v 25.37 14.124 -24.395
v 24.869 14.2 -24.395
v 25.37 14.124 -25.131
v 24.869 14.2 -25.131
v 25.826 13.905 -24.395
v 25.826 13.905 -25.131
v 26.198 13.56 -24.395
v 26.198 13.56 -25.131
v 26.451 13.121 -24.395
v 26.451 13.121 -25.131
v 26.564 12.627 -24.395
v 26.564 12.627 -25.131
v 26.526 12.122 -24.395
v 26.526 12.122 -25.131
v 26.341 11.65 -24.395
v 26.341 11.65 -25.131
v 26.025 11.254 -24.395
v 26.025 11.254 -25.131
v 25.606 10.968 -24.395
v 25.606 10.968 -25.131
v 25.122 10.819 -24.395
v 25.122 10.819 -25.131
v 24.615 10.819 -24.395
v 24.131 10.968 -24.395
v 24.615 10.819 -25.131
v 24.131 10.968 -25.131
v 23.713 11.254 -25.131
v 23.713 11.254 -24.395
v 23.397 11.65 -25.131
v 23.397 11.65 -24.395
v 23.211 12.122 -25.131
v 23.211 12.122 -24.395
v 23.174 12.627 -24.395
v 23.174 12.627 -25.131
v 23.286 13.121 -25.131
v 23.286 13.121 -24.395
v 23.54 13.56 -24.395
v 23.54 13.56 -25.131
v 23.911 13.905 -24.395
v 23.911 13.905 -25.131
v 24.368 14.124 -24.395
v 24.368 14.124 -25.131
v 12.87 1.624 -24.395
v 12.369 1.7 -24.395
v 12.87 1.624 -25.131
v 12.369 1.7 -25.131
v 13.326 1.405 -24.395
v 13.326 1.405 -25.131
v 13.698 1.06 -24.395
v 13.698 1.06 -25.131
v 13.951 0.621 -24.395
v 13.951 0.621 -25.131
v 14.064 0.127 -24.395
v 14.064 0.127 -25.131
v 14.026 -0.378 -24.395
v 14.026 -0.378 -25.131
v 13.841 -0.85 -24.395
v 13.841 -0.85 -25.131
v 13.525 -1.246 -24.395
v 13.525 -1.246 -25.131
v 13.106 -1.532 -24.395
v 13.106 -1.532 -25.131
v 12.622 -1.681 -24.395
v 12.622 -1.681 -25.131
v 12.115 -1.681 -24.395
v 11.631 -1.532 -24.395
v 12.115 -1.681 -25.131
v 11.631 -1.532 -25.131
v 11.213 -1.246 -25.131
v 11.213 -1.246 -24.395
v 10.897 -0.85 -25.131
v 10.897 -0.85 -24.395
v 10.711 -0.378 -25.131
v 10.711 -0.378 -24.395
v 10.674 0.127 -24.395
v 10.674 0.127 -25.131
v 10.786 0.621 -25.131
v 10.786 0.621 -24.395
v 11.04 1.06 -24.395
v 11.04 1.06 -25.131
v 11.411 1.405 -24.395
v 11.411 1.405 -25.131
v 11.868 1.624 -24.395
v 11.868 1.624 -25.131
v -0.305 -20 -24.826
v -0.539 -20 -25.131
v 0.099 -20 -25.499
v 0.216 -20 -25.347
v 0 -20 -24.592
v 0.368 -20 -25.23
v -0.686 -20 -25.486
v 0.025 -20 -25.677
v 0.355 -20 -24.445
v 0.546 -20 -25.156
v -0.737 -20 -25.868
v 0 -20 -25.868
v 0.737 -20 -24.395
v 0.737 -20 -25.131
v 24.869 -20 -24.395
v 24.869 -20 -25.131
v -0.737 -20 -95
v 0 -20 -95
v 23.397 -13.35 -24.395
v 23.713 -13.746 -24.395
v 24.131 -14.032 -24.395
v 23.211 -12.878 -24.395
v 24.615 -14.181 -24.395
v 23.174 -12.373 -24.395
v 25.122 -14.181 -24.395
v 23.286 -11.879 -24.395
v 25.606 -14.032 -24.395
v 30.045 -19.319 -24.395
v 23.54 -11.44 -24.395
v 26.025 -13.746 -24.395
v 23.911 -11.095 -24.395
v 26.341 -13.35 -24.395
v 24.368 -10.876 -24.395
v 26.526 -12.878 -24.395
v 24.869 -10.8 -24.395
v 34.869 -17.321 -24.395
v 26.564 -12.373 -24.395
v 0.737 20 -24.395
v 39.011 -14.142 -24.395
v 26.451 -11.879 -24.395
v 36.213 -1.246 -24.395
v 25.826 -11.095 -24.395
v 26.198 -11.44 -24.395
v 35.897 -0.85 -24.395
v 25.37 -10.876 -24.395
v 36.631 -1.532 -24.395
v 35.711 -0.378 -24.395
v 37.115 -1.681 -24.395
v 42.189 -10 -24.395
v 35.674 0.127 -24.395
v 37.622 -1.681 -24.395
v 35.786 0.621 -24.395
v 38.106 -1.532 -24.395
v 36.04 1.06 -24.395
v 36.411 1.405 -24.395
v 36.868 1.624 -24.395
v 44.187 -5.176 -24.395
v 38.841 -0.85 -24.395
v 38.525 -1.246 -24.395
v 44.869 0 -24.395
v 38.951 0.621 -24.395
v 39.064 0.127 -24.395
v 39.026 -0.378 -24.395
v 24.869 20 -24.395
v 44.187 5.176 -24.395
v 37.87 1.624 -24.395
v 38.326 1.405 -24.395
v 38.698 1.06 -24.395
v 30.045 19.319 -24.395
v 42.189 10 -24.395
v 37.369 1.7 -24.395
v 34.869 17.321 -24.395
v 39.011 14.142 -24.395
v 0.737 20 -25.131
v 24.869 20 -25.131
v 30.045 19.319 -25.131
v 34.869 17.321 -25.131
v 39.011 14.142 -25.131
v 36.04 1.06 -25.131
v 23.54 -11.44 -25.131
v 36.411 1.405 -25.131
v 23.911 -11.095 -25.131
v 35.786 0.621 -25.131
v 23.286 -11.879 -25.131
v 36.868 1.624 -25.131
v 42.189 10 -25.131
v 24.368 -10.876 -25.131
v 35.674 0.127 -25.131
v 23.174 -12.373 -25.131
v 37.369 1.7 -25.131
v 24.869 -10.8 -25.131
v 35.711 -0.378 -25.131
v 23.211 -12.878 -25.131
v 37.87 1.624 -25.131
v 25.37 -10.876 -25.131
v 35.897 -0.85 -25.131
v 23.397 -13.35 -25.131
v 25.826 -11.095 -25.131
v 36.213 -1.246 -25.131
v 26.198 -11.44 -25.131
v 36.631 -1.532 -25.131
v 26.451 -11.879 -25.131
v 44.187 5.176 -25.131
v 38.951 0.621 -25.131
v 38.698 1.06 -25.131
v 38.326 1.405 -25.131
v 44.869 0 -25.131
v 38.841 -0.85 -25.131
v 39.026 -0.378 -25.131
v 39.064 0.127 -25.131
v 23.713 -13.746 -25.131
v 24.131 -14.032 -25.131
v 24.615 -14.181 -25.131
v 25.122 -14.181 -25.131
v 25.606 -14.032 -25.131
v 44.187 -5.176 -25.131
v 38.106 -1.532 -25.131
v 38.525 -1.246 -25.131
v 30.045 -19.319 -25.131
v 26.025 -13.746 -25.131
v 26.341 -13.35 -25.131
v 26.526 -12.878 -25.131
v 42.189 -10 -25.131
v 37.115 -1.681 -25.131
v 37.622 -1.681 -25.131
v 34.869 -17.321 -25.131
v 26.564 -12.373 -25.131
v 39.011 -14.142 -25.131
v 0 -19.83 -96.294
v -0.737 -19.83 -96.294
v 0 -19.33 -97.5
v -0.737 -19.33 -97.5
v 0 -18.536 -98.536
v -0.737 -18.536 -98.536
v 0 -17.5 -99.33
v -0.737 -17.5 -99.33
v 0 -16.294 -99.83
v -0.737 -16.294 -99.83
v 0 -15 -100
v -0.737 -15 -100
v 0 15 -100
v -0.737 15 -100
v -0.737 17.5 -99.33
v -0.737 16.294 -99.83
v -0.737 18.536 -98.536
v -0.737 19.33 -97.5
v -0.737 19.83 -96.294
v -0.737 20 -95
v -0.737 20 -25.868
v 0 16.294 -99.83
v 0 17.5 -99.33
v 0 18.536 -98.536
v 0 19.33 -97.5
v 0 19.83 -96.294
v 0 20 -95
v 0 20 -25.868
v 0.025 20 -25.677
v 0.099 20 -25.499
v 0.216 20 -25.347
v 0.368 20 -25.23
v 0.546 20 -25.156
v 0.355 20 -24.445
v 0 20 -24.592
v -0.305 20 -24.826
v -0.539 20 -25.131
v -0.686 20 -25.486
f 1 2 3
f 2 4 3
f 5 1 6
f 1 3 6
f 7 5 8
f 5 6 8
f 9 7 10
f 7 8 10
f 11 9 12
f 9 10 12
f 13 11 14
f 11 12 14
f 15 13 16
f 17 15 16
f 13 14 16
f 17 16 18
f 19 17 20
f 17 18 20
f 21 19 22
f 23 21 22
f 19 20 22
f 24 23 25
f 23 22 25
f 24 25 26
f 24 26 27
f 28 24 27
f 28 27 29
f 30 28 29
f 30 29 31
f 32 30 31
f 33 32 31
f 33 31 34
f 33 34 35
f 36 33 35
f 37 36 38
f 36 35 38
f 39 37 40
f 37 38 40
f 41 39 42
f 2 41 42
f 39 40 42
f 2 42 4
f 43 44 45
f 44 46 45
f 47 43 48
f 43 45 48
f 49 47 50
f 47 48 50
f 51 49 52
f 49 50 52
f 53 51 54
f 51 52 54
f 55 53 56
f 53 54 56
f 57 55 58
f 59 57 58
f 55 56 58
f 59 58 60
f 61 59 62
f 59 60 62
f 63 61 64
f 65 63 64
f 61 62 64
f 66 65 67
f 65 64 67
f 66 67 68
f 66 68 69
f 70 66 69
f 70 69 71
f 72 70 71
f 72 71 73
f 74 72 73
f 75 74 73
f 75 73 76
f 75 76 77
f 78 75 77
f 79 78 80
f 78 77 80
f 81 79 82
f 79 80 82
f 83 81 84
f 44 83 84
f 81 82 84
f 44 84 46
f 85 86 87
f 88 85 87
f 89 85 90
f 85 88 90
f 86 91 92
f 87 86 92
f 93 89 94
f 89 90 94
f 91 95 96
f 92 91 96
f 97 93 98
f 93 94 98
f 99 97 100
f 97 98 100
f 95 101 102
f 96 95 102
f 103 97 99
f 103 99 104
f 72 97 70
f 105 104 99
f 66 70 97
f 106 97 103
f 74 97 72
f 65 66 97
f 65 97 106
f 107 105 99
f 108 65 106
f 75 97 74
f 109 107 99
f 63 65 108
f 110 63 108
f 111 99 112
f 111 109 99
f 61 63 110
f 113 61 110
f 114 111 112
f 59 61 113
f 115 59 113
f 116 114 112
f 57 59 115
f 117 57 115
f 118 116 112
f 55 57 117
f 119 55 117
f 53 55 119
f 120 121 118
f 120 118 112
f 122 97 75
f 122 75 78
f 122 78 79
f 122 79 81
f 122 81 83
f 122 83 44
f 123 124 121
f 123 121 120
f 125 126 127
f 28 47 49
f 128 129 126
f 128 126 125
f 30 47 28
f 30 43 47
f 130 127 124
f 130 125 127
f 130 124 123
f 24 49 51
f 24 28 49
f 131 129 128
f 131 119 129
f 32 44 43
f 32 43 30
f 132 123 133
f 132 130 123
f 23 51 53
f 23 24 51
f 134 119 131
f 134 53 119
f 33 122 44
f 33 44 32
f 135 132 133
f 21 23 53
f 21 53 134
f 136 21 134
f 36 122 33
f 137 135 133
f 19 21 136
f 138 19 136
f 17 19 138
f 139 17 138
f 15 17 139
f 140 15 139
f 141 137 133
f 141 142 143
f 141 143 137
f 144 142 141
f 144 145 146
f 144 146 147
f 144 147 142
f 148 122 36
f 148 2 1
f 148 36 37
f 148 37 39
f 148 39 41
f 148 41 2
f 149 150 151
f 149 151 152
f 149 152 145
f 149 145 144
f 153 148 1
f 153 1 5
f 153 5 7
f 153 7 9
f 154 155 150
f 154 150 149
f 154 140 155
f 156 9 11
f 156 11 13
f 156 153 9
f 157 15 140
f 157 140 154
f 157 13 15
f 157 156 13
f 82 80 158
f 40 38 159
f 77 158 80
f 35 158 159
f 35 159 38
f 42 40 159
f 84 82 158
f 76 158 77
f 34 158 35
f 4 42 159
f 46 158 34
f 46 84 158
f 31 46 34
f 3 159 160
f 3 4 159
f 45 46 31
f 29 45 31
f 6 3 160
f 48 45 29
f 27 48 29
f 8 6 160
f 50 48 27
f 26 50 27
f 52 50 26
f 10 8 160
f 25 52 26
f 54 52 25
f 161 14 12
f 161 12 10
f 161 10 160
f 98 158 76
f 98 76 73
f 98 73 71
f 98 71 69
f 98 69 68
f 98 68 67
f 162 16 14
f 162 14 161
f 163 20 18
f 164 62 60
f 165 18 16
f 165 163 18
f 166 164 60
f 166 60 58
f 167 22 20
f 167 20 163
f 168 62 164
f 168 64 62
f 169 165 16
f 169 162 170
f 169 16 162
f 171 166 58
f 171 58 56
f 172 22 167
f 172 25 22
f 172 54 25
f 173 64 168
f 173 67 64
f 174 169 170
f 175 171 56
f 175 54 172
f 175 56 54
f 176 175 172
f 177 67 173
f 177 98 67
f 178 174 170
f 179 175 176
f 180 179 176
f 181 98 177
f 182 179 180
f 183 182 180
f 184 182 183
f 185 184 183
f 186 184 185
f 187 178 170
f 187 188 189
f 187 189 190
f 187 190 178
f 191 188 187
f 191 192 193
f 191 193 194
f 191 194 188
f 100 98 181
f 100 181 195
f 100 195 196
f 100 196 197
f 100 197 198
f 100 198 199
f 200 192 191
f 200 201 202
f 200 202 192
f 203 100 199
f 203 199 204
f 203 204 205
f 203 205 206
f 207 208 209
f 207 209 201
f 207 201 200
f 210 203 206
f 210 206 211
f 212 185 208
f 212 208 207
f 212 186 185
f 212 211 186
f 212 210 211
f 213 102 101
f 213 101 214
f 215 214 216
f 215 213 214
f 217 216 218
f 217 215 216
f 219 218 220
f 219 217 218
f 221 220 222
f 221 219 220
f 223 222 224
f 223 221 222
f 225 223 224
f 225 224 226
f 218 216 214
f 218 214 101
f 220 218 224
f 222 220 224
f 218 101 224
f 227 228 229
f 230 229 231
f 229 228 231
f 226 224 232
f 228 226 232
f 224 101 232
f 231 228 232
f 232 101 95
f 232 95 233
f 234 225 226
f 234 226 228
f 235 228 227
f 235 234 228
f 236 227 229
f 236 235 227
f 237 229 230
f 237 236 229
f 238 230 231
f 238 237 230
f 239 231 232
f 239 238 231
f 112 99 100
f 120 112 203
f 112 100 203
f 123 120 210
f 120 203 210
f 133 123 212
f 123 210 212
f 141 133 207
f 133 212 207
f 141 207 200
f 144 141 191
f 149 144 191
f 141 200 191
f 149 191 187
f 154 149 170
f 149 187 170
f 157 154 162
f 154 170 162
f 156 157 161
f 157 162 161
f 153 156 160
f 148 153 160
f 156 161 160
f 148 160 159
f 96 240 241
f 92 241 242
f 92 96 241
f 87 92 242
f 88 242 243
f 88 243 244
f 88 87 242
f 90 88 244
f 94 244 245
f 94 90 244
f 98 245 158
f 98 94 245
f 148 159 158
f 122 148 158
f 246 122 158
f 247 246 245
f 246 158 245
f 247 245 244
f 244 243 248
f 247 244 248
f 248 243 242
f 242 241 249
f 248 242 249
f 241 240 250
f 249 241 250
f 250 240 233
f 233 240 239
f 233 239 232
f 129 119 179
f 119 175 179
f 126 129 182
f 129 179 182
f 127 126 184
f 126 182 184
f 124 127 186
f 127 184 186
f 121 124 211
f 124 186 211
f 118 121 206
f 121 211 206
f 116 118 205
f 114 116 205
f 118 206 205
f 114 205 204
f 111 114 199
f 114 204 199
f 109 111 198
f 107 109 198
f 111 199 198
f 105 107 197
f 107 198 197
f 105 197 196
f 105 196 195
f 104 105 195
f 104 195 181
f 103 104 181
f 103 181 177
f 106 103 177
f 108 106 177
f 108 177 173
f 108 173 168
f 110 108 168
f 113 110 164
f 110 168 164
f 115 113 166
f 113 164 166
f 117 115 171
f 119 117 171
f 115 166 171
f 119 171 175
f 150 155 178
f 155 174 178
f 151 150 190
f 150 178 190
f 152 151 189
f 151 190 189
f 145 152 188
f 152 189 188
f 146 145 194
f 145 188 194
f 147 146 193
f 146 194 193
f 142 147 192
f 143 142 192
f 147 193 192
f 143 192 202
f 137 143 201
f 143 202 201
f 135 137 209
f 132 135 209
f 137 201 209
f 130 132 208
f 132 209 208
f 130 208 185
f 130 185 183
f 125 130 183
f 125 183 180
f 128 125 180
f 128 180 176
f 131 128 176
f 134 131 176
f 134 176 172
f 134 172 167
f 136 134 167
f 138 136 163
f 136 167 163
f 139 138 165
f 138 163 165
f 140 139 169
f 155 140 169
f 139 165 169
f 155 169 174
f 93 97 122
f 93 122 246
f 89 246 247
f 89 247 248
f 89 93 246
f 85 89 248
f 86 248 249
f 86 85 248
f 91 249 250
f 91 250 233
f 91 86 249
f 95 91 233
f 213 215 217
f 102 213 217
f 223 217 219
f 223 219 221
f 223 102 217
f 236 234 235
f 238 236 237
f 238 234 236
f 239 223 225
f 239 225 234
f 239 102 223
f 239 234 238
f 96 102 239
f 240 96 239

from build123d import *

# Parameters (mm, degrees)
BASE_FLANGE1_DEPTH       = 0.7366
SKETCHED_START           = -24.545942999
SKETCHED_BEND1_OUTLINE_W = 0.7366
SKETCHED_BEND1_OUTLINE_H = 40
SKETCHED_BEND1_DEPTH     = 45.545942999
SKETCHED_START_2         = -25.131186431
SKETCHED_BEND1_2_DEPTH   = 0.004036568
SKETCHED_START_3         = -25.867786431
SKETCHED_BEND1_3_DEPTH   = 1.4732
SKETCHED_START_4         = -20
SKETCHED_BEND1_4_DEPTH   = 40
M3_CLEARANCE_HOLE1_D     = 3.4
M3_CLEARANCE_HOLE1_DEPTH = 0.7366
M3_CLEARANCE_HOLE1_TIP   = 1.021463052


with BuildPart() as part:
    # Base-Flange1: sheet metal written as solids
    # Sketch1 → Base-Flange1 (new body)
    with BuildSketch(Plane.YZ):
        with BuildLine():
            Line((-20, 0), (-20, -95))
            ThreePointArc((-20, -95), (-18.535533906, -98.535533906), (-15, -100))
            Line((-15, -100), (15, -100))
            ThreePointArc((15, -100), (18.535533906, -98.535533906), (20, -95))
            Line((20, -95), (20, 0))
            ThreePointArc((20, 0), (0, 20), (-20, 0))
        make_face()
    extrude(amount=-BASE_FLANGE1_DEPTH)

    # Sketched Bend1: read off the stored shape, not the designer's step
    # Sketched Bend1 outline → Sketched Bend1 (cut)
    with BuildSketch(Plane.XY.offset(SKETCHED_START)):
        with Locations((-0.3683, 0)):
            Rectangle(SKETCHED_BEND1_OUTLINE_W, SKETCHED_BEND1_OUTLINE_H)
    extrude(amount=SKETCHED_BEND1_DEPTH, mode=Mode.SUBTRACT)

    # Sketched Bend1 2 outline → Sketched Bend1 2 (add)
    with BuildSketch(Plane.XY.offset(SKETCHED_START_2)):
        with BuildLine():
            ThreePointArc((24.868813569, -20), (44.868813569, 0), (24.868813569, 20))
            Line((24.868813569, 20), (0, 20))
            Line((0, 20), (0, -20))
            Line((0, -20), (24.868813569, -20))
        make_face()
    extrude(amount=SKETCHED_BEND1_2_DEPTH)

    # Sketched Bend1 3 outline → Sketched Bend1 3 (add)
    with BuildSketch(Plane.XY.offset(SKETCHED_START_3)):
        with BuildLine():
            ThreePointArc((24.868813569, -20), (44.868813569, 0), (24.868813569, 20))
            Line((24.868813569, 20), (0, 20))
            Line((0, 20), (0, -20))
            Line((0, -20), (24.868813569, -20))
        make_face()
    extrude(amount=SKETCHED_BEND1_3_DEPTH)

    # Sketched Bend1 4 outline → Sketched Bend1 4 (cut)
    with BuildSketch(Plane(origin=(0, 0, 0), x_dir=(1, 0, 0), z_dir=(0, 1, 0)).offset(SKETCHED_START_4)):
        with BuildLine():
            ThreePointArc((0, 25.867786431), (0.215745145, 25.346931576), (0.7366, 25.131186431))
            Line((0.7366, 25.131186431), (46, 25.131186431))
            Line((46, 25.131186431), (46, 25.867786431))
            Line((46, 25.867786431), (0, 25.867786431))
        make_face()
        with BuildLine():
            Line((46, 23), (46, 24.394586426))
            Line((46, 24.394586426), (0.7366, 24.394586431))
            ThreePointArc((0.7366, 24.394586431), (-0.30510971, 24.826076721), (-0.7366, 25.867786431))
            Line((-0.7366, 25.867786431), (-0.7366, 27))
            Line((-0.7366, 27), (-2, 27))
            Line((-2, 27), (-2, 24.545942999))
            Line((-2, 24.545942999), (0, 24.545942999))
            Line((0, 24.545942999), (0, 23))
            Line((0, 23), (46, 23))
        make_face()
    extrude(amount=SKETCHED_BEND1_4_DEPTH, mode=Mode.SUBTRACT)

    # M3 Clearance Hole1
    with Locations(Plane(origin=(0, 0, -24.394586431), x_dir=(0, -1, 0), z_dir=(0, 0, 1))):
        with Locations((0, 37.368813569), (-12.5, 24.868813569), (0, 12.368813569), (12.5, 24.868813569)):
            Hole(M3_CLEARANCE_HOLE1_D / 2, depth=M3_CLEARANCE_HOLE1_DEPTH)
            with Locations((0, 0, -(M3_CLEARANCE_HOLE1_DEPTH + M3_CLEARANCE_HOLE1_TIP / 2))):  # 118° drill point
                Cone(0, M3_CLEARANCE_HOLE1_D / 2, M3_CLEARANCE_HOLE1_TIP, mode=Mode.SUBTRACT)


solid = part.part
